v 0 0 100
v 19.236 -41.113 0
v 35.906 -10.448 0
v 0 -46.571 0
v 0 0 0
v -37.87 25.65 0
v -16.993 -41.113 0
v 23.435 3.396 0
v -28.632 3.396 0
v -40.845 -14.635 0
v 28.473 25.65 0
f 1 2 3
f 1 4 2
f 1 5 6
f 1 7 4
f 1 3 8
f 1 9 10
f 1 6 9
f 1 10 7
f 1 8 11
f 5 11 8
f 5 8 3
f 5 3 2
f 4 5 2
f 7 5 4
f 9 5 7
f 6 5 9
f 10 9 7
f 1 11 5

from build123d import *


with BuildPart() as f3:
    # F0 (on Top) → F3 section 0
    with BuildSketch(Plane.XY, mode=Mode.PRIVATE) as f3_s0:
        Polygon((28.473403, 25.65019), (0, 0), (-37.869632, 25.65019), (-28.631995, 3.395881), (-40.844899, -14.635104), (-16.992594, -41.112736), (0, -46.57134), (19.235764, -41.112736), (35.906301, -10.448431), (23.434689, 3.395881), align=None)
    loft([Vertex(0, 0, 100), f3_s0.sketch])


solid = f3.part
